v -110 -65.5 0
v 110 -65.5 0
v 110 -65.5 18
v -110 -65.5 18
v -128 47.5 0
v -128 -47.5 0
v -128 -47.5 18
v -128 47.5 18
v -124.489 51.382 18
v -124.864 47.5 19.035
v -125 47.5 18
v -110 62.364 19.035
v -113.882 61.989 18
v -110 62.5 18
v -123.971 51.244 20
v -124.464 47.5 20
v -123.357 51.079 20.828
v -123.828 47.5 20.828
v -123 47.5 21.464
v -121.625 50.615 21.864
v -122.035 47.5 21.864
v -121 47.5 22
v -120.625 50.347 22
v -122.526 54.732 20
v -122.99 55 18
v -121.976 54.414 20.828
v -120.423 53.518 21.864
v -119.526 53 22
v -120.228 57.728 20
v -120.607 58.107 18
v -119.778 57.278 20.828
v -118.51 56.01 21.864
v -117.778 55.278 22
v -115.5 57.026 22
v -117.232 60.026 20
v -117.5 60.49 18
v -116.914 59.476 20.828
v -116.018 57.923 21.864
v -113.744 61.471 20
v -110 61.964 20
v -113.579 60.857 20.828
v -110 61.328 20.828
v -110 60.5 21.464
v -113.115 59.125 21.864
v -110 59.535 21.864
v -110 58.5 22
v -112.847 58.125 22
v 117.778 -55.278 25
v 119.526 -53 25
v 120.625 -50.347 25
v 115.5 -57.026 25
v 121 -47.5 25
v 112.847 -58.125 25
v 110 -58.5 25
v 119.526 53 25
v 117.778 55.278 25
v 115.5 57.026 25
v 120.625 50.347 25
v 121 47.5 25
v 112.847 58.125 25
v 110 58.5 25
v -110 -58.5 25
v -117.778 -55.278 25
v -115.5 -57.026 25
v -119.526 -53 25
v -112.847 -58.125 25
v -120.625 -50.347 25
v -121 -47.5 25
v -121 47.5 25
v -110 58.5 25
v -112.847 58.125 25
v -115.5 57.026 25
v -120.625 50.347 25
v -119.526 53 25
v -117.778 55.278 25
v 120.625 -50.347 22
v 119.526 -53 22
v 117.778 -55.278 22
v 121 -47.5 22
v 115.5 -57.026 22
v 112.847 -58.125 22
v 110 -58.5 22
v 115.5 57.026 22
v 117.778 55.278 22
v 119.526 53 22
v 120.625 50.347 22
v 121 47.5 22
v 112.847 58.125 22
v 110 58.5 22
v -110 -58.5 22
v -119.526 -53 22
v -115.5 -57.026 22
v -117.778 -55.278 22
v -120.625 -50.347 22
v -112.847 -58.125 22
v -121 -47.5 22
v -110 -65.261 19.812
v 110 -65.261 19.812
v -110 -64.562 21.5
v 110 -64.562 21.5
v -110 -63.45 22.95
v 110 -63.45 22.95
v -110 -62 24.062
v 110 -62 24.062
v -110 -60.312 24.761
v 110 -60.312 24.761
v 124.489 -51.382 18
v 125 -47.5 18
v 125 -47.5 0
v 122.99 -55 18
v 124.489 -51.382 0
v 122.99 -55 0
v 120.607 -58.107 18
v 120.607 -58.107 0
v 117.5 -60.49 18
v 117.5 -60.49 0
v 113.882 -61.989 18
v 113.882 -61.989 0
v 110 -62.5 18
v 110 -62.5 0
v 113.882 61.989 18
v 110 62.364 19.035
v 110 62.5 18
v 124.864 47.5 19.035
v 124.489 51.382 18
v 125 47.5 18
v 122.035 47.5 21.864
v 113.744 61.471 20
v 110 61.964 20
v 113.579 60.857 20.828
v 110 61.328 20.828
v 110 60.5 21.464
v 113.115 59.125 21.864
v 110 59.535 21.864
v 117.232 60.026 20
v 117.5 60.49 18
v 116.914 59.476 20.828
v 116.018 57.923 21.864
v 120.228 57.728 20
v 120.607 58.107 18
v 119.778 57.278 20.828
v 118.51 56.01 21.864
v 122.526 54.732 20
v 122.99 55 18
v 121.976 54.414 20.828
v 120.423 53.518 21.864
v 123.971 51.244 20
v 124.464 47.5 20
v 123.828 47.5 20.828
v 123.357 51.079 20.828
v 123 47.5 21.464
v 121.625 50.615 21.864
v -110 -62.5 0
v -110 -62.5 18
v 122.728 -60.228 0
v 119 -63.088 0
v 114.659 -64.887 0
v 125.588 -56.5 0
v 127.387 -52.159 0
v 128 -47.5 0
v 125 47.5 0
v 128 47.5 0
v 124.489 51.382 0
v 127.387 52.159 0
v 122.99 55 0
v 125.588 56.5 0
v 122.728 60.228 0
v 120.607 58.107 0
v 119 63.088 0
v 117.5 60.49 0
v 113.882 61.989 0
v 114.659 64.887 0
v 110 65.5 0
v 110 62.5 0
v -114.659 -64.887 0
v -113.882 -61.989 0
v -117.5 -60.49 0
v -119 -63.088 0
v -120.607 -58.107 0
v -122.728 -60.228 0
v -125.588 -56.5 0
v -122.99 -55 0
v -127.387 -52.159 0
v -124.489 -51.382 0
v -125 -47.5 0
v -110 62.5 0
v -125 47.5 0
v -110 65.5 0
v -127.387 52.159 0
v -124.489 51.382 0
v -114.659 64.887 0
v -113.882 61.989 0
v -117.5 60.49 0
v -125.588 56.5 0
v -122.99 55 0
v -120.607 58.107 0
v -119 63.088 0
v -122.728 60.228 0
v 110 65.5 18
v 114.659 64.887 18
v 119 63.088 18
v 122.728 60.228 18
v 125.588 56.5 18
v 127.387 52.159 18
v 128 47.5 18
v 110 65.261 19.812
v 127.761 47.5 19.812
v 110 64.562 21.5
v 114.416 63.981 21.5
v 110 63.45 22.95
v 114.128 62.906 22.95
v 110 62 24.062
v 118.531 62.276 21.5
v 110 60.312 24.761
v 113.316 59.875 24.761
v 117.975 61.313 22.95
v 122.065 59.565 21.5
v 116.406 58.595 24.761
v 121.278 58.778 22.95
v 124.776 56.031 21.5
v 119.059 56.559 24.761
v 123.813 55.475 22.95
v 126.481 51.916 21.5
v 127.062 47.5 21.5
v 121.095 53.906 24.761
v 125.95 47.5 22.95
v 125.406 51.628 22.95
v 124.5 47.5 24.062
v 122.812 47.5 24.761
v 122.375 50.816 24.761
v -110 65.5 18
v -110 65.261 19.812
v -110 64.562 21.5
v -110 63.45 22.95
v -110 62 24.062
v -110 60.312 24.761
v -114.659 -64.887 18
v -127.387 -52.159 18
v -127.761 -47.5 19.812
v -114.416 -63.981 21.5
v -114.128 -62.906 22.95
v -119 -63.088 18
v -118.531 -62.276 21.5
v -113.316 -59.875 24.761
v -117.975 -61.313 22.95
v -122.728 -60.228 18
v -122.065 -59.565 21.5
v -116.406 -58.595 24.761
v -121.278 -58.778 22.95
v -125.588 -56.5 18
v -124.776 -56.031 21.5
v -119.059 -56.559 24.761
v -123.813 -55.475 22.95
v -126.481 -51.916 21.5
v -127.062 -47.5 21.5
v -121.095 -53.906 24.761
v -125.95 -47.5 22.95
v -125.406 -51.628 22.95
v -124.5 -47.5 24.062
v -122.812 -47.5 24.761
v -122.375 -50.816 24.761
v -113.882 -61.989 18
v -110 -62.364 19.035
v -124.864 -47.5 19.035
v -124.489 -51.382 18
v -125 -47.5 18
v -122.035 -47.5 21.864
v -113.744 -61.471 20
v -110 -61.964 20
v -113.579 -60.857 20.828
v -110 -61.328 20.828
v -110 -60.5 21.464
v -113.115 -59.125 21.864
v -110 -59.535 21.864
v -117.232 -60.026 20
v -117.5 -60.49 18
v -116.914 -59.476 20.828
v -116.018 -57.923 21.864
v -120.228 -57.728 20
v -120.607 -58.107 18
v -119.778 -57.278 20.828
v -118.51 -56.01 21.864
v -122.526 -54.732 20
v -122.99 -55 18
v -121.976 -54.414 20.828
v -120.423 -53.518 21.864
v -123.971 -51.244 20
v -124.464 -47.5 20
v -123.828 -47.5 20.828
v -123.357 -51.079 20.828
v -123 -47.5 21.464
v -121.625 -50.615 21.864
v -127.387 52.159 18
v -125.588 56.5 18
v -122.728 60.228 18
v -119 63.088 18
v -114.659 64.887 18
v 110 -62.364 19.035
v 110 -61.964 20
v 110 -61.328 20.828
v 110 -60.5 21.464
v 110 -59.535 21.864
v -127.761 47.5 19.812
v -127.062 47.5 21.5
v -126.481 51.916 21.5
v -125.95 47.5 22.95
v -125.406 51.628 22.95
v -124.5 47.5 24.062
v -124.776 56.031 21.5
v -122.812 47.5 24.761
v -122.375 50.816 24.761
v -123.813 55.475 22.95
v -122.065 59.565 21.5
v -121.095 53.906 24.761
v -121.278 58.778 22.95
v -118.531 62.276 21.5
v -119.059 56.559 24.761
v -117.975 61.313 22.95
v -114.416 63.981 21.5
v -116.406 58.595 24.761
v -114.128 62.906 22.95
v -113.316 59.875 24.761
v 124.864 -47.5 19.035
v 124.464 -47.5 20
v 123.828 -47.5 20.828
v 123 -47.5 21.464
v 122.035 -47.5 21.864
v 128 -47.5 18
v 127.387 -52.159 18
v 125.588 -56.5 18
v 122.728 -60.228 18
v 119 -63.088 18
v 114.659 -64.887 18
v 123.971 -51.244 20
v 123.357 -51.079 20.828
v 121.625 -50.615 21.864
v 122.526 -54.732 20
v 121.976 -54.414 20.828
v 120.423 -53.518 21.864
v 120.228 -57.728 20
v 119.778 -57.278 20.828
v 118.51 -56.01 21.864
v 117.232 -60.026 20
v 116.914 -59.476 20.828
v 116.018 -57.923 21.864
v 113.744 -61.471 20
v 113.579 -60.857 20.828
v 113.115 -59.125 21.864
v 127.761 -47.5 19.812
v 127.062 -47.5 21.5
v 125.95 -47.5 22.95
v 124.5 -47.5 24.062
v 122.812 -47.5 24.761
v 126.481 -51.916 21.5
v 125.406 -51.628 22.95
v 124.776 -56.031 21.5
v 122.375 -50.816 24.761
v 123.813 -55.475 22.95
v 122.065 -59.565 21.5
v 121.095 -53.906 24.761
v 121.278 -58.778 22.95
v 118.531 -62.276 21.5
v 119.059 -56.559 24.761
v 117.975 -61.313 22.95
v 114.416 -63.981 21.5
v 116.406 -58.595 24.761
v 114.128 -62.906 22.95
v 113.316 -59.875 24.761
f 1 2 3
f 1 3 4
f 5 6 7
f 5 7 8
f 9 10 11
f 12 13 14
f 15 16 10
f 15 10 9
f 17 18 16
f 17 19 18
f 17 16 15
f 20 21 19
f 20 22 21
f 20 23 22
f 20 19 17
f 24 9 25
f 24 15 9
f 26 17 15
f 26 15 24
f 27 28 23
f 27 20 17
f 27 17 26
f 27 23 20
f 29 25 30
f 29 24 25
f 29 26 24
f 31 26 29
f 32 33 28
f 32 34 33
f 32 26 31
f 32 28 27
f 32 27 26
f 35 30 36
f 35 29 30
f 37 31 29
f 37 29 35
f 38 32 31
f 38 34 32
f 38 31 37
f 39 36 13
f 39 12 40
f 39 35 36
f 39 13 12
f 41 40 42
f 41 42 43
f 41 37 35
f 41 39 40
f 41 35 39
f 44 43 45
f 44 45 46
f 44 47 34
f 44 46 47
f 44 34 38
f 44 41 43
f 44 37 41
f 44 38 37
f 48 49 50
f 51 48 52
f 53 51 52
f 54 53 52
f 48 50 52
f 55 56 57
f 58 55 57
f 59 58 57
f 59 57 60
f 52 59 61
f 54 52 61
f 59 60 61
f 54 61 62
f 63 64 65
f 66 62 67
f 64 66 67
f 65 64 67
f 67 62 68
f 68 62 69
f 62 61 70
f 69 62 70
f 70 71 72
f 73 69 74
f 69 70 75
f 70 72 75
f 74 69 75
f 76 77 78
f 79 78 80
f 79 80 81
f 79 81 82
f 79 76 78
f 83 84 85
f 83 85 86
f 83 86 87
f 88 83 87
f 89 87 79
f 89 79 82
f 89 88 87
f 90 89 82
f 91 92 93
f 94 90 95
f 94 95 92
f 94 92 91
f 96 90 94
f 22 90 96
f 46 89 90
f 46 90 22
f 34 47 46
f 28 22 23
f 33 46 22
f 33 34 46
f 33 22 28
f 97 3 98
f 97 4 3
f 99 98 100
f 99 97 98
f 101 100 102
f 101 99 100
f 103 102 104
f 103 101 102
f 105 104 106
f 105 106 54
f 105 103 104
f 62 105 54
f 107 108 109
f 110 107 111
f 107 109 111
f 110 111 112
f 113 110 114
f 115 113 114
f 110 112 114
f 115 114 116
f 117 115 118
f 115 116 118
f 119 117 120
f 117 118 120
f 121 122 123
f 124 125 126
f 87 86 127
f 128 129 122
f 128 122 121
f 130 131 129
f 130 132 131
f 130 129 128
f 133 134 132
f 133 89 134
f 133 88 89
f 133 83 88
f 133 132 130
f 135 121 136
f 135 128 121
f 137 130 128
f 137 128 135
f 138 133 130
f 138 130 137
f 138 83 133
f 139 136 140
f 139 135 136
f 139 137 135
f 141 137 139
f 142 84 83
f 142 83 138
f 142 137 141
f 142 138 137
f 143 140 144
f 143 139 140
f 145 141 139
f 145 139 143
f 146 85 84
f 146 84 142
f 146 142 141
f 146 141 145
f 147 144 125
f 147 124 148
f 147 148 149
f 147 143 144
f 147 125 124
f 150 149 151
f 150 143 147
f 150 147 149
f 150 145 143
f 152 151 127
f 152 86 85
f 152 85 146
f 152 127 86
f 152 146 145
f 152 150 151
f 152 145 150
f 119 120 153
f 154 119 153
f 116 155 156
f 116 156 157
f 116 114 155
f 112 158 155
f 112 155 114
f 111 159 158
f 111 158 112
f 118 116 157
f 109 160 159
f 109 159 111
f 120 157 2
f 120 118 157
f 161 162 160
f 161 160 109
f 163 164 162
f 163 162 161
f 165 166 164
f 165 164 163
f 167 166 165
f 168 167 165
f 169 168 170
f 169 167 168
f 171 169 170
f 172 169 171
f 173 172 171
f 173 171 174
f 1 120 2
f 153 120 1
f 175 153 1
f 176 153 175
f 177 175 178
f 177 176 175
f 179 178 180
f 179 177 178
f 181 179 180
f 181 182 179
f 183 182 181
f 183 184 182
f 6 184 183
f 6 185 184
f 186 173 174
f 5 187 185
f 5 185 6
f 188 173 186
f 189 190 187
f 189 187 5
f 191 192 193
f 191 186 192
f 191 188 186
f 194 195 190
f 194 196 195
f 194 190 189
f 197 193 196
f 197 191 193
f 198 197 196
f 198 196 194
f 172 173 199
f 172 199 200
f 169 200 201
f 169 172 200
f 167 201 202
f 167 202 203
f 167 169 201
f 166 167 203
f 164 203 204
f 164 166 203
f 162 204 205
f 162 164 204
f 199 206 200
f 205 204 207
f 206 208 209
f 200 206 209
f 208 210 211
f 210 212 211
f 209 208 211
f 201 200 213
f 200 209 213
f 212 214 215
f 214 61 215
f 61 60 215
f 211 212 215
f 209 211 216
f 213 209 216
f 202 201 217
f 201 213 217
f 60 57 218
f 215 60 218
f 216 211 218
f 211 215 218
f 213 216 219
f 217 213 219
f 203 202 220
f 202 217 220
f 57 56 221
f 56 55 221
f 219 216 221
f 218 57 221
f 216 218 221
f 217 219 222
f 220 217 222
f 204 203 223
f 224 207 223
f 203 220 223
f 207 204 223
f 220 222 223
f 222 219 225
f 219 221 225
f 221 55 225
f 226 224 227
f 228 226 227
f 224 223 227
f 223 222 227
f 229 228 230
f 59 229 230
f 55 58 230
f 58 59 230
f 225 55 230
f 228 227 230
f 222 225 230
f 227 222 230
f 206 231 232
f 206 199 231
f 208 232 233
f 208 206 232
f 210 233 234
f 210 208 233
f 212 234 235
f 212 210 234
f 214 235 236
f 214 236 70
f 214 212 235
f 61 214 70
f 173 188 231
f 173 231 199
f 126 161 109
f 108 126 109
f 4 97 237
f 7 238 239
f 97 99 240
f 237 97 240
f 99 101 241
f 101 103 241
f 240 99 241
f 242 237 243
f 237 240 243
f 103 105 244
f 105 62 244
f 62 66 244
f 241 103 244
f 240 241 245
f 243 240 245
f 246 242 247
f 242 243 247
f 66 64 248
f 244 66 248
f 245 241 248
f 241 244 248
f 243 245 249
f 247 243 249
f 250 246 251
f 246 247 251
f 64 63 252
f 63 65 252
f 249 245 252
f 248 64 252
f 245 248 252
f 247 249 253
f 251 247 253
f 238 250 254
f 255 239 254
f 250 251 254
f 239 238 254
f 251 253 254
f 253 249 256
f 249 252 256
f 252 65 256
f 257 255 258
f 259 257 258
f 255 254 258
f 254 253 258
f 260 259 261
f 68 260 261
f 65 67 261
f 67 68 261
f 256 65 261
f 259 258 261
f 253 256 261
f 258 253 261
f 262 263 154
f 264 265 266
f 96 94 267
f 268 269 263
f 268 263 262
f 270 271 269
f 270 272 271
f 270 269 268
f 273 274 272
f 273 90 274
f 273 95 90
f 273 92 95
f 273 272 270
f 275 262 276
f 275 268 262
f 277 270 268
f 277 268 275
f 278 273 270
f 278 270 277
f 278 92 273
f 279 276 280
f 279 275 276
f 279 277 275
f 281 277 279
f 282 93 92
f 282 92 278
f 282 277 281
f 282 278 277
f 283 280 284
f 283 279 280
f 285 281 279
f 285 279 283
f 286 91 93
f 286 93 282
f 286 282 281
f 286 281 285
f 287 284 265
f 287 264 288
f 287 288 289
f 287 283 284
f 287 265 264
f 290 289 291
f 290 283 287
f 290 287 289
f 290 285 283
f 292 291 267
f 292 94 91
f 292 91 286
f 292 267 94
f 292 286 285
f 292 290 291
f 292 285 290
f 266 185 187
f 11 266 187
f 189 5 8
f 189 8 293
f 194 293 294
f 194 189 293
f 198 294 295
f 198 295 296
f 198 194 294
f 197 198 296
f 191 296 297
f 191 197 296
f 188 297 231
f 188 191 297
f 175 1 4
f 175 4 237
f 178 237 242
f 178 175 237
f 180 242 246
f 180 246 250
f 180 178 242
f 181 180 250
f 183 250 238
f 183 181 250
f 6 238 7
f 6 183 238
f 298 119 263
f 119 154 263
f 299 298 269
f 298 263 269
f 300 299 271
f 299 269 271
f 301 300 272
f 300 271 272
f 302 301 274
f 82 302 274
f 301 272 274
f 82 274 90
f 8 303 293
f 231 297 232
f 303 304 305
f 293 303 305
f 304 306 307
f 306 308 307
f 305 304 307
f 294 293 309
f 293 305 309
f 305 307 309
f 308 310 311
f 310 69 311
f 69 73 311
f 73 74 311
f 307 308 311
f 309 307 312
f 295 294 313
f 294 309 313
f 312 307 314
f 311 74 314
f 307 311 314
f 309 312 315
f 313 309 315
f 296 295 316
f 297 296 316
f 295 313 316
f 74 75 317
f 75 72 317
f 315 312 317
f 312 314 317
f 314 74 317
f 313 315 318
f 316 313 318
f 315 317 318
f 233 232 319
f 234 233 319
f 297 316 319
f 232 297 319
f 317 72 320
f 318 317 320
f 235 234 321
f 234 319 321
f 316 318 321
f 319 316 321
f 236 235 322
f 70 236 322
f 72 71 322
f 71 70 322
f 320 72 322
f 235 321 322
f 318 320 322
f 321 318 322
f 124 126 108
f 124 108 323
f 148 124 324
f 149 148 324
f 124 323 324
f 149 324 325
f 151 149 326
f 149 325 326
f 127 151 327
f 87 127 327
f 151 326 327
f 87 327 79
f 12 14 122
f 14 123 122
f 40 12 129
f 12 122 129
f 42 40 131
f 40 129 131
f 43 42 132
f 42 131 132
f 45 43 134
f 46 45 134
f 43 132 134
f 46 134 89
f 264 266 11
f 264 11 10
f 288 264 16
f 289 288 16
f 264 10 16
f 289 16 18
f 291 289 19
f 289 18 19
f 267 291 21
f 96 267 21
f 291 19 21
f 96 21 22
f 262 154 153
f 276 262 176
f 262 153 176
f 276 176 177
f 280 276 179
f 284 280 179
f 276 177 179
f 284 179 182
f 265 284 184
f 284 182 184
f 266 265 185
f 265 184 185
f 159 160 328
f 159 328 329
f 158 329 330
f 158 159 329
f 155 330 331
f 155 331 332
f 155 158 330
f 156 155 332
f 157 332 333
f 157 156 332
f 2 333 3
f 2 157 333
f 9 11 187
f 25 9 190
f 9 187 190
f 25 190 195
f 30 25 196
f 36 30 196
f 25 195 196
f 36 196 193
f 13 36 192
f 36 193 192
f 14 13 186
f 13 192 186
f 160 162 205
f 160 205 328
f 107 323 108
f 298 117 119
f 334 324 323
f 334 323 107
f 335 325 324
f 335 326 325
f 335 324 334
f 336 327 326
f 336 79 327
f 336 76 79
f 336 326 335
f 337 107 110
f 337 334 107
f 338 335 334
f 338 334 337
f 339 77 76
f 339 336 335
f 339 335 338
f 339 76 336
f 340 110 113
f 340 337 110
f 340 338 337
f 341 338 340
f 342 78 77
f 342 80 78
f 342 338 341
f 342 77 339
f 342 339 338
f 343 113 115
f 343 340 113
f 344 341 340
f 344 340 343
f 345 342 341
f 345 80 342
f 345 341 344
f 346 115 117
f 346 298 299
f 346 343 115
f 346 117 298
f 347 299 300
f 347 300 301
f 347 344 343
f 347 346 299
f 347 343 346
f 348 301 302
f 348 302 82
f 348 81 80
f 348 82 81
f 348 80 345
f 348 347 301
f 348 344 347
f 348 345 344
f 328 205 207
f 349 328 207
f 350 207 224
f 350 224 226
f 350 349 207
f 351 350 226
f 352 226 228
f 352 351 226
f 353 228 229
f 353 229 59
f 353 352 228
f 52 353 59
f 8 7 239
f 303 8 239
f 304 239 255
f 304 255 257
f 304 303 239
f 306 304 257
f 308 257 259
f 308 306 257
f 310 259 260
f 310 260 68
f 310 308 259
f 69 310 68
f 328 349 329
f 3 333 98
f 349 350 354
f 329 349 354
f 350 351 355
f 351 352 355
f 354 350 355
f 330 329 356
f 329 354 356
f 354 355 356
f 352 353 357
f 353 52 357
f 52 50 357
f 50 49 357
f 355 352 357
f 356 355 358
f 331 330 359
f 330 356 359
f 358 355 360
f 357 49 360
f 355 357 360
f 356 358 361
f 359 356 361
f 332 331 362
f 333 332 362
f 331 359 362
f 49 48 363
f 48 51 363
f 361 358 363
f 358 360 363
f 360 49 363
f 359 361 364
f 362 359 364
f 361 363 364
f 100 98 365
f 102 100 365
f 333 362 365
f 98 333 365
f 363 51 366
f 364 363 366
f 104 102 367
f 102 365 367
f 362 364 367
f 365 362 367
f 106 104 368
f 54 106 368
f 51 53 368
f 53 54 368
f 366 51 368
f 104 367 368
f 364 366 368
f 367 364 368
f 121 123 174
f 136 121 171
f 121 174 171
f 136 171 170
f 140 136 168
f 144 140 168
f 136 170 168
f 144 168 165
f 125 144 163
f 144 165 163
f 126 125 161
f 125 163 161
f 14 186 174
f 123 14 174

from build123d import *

# Parameters (mm, degrees)
SALIENTE_EXTRUIR1_DEPTH = 25
REDONDEO1_R             = 7
VACIADO1_T              = -3


with BuildPart() as part:
    # Croquis1 → Saliente-Extruir1 (new body)
    with BuildSketch(Plane.XY):
        with BuildLine():
            Line((-110, 65.5), (110, 65.5))
            ThreePointArc((110, 65.5), (122.727922061, 60.227922061), (128, 47.5))
            Line((128, 47.5), (128, -47.5))
            ThreePointArc((128, -47.5), (122.727922061, -60.227922061), (110, -65.5))
            Line((110, -65.5), (-110, -65.5))
            ThreePointArc((-110, -65.5), (-122.727922061, -60.227922061), (-128, -47.5))
            Line((-128, -47.5), (-128, 47.5))
            ThreePointArc((-128, 47.5), (-122.727922061, 60.227922061), (-110, 65.5))
        make_face()
    extrude(amount=SALIENTE_EXTRUIR1_DEPTH)

    # Redondeo1
    redondeo1_edges = [part.edges().sort_by_distance(p)[0] for p in [
        (-122.727922061, 60.227922061, 25),
        (-128, 0, 25),
        (-122.727922061, -60.227922061, 25),
        (0, -65.5, 25),
        (122.727922061, -60.227922061, 25),
        (128, 0, 25),
        (122.727922061, 60.227922061, 25),
        (0, 65.5, 25),
    ]]
    fillet(redondeo1_edges, radius=REDONDEO1_R)

    # Vaciado1
    vaciado1_openings = [part.faces().sort_by_distance(p)[0] for p in [
        (0, 0, 0),
    ]]
    offset(amount=VACIADO1_T, openings=vaciado1_openings, kind=Kind.INTERSECTION)


solid = part.part
